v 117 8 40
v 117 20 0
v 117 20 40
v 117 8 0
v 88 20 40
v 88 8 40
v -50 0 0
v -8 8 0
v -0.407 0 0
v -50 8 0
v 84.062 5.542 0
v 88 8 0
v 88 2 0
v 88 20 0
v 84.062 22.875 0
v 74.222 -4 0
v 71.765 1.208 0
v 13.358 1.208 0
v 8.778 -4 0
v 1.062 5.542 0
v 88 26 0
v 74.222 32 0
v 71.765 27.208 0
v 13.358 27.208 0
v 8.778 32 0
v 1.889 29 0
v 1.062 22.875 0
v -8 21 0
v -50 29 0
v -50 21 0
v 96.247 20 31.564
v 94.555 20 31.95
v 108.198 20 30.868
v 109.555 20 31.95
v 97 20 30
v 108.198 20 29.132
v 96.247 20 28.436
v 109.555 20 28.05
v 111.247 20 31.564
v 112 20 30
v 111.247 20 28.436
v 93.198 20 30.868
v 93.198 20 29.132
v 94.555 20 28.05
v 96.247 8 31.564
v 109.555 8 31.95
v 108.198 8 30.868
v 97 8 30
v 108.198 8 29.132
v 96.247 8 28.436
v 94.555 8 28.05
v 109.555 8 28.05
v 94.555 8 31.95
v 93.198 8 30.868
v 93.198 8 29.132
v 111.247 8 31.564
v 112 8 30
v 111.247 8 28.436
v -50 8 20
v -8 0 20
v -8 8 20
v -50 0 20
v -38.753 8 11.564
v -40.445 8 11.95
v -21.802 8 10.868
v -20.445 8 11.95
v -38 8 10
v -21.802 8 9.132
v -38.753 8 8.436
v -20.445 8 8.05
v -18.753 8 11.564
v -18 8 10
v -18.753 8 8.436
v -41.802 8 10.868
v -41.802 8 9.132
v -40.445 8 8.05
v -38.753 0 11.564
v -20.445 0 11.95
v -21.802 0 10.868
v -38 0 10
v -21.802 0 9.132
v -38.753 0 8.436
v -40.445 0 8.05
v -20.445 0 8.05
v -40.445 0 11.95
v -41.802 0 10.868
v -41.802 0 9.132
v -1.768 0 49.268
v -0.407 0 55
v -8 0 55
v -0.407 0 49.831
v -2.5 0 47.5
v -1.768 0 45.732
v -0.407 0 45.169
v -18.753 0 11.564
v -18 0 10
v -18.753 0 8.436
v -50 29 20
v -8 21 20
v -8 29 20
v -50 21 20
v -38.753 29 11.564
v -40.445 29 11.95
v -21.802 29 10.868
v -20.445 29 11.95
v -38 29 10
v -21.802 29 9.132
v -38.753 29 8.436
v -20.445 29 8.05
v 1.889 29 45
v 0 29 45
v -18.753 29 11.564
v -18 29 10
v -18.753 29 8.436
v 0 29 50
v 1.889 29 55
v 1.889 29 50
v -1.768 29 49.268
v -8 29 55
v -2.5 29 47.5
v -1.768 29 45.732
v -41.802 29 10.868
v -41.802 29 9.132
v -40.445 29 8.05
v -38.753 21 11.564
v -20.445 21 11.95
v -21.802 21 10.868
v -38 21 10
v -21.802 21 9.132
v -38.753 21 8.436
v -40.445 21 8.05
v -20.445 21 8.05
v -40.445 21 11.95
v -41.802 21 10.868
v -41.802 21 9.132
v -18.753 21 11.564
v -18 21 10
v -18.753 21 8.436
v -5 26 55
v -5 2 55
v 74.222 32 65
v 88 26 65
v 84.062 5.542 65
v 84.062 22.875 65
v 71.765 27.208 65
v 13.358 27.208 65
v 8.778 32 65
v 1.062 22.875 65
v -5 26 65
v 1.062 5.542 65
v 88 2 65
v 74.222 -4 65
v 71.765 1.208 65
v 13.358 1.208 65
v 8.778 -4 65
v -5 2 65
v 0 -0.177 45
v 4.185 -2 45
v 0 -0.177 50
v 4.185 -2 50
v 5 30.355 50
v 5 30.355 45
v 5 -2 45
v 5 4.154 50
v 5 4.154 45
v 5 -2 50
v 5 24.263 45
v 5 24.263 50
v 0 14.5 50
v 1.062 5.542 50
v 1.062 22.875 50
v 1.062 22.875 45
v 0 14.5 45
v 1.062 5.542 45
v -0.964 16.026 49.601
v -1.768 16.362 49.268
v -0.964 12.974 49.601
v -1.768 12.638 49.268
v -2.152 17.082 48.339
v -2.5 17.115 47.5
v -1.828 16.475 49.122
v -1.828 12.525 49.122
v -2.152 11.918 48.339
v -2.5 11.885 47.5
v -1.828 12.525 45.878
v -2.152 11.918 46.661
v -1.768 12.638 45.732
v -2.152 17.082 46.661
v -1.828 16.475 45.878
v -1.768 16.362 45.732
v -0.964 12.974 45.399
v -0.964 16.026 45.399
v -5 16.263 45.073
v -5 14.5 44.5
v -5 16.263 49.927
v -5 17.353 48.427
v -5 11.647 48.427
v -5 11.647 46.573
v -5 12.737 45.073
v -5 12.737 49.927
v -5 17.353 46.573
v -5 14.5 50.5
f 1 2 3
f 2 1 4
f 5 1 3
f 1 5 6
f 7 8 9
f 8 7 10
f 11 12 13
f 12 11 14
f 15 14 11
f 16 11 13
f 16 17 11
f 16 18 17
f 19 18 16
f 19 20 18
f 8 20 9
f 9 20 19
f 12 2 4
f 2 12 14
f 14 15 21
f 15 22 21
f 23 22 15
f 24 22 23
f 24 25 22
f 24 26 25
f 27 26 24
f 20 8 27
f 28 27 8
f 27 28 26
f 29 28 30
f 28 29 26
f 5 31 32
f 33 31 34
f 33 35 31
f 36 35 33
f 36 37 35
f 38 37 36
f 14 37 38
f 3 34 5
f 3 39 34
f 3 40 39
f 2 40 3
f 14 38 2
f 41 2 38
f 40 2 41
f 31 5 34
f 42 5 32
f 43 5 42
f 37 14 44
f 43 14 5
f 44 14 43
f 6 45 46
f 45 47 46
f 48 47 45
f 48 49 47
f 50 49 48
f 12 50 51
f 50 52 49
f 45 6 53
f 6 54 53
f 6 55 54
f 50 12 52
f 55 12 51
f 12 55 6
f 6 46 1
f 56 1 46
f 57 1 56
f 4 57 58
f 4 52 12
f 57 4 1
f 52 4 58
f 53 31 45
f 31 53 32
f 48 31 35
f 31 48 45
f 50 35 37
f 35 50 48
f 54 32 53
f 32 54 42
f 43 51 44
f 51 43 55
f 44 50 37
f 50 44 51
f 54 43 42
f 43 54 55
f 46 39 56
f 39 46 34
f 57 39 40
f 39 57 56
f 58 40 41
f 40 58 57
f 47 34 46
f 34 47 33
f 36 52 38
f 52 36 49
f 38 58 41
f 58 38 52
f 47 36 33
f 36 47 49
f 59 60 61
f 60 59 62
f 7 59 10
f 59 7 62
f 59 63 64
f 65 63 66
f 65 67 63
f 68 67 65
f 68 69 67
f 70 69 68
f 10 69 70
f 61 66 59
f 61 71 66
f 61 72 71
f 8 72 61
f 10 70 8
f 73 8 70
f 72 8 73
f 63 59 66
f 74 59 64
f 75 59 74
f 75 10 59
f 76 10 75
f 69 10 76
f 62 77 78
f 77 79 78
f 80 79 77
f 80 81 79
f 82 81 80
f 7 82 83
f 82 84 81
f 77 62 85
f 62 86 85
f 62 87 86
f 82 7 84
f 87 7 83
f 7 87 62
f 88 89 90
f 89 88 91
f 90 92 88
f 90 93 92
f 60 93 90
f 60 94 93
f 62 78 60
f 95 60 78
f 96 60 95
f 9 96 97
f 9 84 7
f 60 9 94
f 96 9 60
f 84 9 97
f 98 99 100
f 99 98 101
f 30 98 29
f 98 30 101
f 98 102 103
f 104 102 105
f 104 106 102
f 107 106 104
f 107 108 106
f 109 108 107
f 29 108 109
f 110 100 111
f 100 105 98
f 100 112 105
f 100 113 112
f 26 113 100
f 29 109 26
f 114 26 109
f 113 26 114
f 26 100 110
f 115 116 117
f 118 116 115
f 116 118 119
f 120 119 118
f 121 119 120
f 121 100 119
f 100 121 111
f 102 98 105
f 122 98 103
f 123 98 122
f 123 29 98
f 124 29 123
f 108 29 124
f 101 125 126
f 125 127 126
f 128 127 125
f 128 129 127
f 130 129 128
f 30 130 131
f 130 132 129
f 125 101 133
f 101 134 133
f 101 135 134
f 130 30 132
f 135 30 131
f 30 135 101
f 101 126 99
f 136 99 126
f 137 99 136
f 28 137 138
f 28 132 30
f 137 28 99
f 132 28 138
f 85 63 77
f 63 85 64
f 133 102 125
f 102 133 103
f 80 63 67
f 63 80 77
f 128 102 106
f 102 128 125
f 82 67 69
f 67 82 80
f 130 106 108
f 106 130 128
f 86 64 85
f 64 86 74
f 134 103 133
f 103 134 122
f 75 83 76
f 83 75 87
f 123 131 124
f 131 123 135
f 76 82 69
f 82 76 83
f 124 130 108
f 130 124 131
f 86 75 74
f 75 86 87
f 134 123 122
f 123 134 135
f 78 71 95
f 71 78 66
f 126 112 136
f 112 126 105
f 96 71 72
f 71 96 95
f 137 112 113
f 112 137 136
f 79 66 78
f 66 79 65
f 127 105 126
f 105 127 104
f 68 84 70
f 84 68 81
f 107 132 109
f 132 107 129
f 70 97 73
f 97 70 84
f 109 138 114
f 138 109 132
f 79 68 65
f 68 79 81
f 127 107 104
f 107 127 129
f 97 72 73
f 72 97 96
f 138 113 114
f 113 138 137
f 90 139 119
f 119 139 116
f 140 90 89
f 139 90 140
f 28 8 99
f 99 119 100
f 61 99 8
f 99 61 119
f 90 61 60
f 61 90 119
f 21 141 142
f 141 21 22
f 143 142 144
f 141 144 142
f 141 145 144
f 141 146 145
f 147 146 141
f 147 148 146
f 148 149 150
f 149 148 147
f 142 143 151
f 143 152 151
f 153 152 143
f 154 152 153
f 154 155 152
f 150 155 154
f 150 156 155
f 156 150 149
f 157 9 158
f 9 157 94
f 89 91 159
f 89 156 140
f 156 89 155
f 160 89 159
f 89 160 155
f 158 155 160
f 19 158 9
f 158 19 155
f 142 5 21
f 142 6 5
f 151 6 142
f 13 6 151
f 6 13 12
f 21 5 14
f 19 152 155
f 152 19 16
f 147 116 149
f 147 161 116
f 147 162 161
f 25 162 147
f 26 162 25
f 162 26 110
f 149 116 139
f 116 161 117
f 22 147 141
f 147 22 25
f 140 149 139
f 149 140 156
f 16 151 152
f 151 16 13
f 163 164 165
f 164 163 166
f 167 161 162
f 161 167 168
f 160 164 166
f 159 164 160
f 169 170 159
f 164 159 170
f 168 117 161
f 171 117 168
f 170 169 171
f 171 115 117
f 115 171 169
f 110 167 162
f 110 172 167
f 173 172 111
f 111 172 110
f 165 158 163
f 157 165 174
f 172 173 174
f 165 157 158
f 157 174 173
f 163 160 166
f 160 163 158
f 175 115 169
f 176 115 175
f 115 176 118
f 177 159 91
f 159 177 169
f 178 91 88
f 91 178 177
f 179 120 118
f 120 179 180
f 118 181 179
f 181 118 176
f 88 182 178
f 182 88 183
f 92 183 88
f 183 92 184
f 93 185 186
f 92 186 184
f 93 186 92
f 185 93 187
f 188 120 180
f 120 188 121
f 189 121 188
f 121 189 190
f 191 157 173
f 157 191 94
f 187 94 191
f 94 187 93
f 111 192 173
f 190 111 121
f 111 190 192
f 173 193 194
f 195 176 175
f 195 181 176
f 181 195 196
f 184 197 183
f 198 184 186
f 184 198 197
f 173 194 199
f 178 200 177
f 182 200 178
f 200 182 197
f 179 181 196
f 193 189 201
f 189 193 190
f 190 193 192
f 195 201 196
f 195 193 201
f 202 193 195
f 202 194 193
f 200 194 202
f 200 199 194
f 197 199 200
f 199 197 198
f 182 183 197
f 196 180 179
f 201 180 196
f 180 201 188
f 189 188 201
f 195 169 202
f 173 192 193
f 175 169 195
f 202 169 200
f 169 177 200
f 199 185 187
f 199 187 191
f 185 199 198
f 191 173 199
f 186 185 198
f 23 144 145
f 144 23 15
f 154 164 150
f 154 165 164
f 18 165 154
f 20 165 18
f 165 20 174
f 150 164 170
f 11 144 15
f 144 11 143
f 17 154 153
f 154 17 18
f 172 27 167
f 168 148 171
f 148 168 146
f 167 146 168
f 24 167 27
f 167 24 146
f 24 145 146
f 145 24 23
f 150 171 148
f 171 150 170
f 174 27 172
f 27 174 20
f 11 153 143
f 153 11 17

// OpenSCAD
//Project Anubis - Lower Receiver for Open Source Community Blaster
// (c) Michael Harratt 2014 - Available under license CC-BY-SA 4.0 International

module MagazineGeometry()
{
		//Measure for complete Nerf N-Strike Magazine footprint
		polygon(points = [[0, 4],
								[0, 20],
								[12, 24],
								[69, 24],
								[81, 20],
								[81, 4],
								[69, 0],
								[12, 0]]
					);
}

module MagazineWellHole()
{
	scale([ 83 / 81, 26 / 24, 1])
	{
		linear_extrude(height = 65)
		{
			MagazineGeometry();
		}
	}
}

module MagazineWellShroud()
{

	scale([93 / 81, 36 / 24, 1])
	{
		linear_extrude(height = 65)
		{
			MagazineGeometry();
		}
	}

}

module MagRetentionHole()
{
	union()
	{
		translate([0, -2, 0])
		{
			cube([5, 40, 5]);
		}

		translate([0, 38, 2.5])
		{
			rotate([90, 0, 0]) cylinder(r = 5/ 2, h = 40);
		}

		translate([-5, 14.5, 2.5])
		{
			rotate([0, 90, 0])
			{
				cylinder(r = 3, r2 = 2.5, h = 5);
			}
		}
	}
}

module TriggerClusterInterface()
{

	difference()
	{
		union()
		{
			translate([50, 0, 0])
			{
				cube([50, 8, 20]);
			}

			translate([50, 21, 0])
			{
				cube([50, 8, 20]);
			}
		}

		//Cluster Mounting Holes
		translate([60, 40, 10])
		{
			rotate([90, 0, 0]) cylinder(r=2, h = 50);
		}

		translate([80, 40, 10])
		{
			rotate([90, 0, 0]) cylinder(r=2, h = 50);
		}

	}

}

module MagWellRearHousing()
{

	cube([30, 29, 55]);

}

module MagWellForwardHousing()
{
	difference()
	{
		translate([27, 8, 0])
		{	
			cube([30, 12, 40]);
		}

		translate([35, 50, 30])
		{
			rotate([90, 0, 0]) 
			{
				cylinder(r = 2, h = 100); //Screw Hole
			}
		}

		translate([50, 50, 30])
		{
			rotate([90, 0, 0]) 
			{
				cylinder(r = 2, h = 100); //Screw Hole
			}				
		}
	}
}

//Produce a working lower receiver
module CompleteLowerReceiver()
{
	difference()
	{
		union()
		{
			translate([-8, 0, 0])
			{
				MagWellRearHousing();
			}

			translate([60, 0, 0])
			{
				MagWellForwardHousing();
			}

			translate([-5, -4, 0])
			{
				MagazineWellShroud();
			}
		
			translate([-100, 0, 0])
			{
				TriggerClusterInterface();
			}
		}

		translate([0, 0, 45])
		{
			MagRetentionHole();
		}

		translate([(86 / 81), (29 / 24), 0])
		{
			MagazineWellHole();
		}
	}
}

CompleteLowerReceiver();
//MagWellForwardHousing();
